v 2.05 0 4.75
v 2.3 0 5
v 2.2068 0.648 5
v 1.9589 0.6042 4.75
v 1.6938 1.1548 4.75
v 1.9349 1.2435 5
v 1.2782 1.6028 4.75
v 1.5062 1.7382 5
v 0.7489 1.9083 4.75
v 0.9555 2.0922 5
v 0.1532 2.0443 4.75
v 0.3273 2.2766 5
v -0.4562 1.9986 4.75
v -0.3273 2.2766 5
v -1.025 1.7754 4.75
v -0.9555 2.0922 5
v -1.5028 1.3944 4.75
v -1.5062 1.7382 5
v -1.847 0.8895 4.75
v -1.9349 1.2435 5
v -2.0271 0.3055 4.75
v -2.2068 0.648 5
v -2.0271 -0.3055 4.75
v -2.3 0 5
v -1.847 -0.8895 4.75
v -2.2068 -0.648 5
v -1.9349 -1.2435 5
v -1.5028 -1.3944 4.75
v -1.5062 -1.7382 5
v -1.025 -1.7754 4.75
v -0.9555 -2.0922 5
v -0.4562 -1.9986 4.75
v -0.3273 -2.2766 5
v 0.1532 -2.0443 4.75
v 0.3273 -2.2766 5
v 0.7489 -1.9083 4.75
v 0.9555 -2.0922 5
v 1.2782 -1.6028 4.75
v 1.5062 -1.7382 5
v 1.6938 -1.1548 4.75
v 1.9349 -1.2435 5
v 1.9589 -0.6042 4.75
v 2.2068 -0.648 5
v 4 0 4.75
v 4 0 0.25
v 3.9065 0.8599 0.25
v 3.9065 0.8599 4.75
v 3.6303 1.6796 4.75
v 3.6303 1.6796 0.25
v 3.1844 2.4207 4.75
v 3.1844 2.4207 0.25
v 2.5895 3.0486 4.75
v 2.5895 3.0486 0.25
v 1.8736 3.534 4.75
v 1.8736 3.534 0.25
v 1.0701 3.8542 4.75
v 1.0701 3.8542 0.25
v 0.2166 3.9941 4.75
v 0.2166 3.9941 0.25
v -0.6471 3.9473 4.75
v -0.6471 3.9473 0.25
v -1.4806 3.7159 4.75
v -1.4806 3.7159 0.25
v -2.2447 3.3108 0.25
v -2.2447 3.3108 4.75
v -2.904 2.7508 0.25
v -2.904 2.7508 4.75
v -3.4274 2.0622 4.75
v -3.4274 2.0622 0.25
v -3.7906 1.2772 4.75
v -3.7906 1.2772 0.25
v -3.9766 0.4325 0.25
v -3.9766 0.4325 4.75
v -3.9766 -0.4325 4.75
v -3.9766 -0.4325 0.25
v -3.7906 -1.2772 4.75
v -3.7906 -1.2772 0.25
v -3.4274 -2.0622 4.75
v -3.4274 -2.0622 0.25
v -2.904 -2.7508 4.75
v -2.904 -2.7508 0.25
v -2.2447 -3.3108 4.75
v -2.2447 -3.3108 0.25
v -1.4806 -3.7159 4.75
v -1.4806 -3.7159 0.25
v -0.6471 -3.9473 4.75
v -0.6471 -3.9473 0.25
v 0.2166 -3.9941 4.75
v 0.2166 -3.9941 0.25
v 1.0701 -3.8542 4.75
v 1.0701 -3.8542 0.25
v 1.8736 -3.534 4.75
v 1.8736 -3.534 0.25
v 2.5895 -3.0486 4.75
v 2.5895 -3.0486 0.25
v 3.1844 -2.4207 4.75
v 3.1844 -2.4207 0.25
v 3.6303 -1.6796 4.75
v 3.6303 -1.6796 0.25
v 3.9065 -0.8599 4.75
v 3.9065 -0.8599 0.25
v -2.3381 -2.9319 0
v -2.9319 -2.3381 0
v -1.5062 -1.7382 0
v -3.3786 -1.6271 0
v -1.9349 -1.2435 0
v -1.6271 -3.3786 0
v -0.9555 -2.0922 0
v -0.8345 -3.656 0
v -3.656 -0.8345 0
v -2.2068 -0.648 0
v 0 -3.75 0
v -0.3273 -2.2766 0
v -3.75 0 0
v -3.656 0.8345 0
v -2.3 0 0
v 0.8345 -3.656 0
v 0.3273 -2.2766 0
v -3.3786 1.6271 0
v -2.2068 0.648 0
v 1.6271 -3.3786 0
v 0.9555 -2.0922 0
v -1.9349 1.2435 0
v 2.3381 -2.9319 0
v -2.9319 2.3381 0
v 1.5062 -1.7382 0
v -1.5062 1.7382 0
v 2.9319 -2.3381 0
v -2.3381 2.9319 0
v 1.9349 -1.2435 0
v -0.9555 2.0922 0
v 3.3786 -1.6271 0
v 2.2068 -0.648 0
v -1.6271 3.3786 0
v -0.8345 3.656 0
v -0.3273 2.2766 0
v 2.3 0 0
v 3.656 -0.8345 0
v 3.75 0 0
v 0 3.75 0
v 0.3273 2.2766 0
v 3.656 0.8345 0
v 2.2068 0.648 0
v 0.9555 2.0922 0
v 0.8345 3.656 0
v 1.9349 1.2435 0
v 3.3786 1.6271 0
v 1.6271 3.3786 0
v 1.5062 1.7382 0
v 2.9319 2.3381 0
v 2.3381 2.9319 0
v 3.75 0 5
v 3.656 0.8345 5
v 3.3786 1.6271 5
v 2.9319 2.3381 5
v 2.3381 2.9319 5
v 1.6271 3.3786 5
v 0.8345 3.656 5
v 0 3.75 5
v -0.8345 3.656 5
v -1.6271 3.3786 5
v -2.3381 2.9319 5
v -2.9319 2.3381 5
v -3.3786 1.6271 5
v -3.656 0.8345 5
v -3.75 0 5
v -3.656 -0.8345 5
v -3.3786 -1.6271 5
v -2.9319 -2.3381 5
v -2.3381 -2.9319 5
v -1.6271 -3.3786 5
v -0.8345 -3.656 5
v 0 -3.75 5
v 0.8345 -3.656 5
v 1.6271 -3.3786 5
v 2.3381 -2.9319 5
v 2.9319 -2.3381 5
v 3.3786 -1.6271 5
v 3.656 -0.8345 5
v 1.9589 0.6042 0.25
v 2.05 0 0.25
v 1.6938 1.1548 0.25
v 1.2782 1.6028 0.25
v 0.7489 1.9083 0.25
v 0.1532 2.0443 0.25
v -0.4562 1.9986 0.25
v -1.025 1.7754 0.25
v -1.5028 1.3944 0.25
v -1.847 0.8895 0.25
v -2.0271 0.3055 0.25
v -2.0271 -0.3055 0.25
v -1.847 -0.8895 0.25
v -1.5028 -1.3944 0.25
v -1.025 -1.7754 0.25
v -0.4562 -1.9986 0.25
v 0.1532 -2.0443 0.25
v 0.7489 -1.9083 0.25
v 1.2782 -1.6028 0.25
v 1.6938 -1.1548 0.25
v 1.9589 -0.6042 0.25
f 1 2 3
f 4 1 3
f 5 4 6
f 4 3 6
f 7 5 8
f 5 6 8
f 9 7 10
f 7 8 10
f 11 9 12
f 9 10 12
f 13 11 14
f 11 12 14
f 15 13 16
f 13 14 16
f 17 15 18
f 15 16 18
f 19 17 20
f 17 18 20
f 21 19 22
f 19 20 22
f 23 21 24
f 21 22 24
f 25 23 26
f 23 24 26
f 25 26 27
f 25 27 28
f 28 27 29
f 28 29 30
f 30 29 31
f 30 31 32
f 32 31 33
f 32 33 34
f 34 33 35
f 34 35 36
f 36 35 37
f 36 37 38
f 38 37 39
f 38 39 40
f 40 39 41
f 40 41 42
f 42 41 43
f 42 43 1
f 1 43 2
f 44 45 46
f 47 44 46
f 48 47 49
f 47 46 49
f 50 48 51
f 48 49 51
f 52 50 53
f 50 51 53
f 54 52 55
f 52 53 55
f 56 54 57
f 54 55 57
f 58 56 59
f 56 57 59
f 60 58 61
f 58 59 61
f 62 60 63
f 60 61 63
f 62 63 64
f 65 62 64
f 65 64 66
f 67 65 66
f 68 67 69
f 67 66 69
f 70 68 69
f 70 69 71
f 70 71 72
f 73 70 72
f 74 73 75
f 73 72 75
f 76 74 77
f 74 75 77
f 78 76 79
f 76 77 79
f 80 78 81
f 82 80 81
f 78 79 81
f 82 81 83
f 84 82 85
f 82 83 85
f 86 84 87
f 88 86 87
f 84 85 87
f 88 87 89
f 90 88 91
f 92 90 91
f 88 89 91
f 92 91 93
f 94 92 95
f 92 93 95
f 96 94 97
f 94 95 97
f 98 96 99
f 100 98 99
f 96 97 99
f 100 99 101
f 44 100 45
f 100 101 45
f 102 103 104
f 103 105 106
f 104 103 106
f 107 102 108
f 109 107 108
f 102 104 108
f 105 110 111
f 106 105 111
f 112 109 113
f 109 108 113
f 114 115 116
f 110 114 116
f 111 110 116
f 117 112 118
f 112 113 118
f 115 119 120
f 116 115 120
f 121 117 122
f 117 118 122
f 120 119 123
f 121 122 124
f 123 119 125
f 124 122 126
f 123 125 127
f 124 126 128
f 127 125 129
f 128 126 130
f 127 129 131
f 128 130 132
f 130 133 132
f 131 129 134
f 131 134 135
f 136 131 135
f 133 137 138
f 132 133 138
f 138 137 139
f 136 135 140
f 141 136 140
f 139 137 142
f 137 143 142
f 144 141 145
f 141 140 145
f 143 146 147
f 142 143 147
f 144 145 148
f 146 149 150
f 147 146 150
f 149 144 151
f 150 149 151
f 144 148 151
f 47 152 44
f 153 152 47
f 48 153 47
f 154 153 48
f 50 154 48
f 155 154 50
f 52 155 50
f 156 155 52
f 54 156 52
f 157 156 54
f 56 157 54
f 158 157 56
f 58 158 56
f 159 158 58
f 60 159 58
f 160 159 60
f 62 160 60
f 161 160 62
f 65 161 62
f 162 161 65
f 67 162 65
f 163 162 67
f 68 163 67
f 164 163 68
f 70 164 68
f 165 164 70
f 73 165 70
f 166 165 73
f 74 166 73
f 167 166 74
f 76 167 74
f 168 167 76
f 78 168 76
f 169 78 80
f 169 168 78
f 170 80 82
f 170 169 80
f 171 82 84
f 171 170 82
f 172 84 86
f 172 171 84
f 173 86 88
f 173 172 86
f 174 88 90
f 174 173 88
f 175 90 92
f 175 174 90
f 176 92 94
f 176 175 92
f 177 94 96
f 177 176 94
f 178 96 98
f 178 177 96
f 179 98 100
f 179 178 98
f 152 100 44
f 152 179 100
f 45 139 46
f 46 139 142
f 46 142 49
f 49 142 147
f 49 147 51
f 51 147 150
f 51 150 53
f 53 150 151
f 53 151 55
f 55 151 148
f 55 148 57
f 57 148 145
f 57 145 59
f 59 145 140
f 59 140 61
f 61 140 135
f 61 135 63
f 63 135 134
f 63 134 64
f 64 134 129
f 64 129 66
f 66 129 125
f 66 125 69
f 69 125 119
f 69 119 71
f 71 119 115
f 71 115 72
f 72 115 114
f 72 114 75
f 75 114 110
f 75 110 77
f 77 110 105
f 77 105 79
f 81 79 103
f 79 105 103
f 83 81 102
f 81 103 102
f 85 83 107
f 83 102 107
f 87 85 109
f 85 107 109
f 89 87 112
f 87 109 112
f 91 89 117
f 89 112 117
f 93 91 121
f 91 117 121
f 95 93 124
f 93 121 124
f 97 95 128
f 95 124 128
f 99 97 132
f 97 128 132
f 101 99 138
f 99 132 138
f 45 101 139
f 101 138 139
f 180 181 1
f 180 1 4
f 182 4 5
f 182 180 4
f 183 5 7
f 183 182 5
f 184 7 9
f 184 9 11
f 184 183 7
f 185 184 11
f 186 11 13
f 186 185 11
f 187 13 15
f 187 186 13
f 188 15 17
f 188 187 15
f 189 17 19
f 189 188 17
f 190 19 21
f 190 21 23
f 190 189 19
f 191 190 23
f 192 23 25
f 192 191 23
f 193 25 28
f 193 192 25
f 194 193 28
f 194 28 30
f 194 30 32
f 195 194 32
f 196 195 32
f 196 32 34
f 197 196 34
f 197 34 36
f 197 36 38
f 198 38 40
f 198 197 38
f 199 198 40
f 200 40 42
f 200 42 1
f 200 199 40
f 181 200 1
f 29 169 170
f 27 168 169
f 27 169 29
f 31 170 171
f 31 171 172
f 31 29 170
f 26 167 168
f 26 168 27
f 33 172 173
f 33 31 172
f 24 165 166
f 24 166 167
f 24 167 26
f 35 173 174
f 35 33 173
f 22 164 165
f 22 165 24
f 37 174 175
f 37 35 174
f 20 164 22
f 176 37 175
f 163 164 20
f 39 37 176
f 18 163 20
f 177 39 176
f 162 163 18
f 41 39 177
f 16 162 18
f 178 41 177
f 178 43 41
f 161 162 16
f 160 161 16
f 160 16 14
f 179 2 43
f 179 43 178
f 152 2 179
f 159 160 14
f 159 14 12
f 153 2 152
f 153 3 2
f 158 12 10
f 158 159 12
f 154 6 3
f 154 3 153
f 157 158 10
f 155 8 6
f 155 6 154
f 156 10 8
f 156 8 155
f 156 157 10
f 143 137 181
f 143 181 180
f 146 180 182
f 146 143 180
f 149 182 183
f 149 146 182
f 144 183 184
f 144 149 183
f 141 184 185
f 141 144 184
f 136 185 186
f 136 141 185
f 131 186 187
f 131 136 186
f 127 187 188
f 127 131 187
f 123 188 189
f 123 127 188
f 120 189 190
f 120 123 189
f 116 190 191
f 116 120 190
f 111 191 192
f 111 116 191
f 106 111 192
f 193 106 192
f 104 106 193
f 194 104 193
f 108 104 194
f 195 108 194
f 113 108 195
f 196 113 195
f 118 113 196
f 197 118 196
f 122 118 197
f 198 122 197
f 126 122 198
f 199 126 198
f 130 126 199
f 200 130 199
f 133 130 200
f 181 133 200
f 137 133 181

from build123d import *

# Parameters (mm, degrees)
SKETCH1_R      = 4
SKETCH1_R_2    = 2.05
EXTRUDE1_DEPTH = 5
CHAMFER2_SIZE  = 0.25


with BuildPart() as part:
    # Sketch1 → Extrude1 (new body)
    with BuildSketch(Plane.XY):
        Circle(SKETCH1_R)
        Circle(SKETCH1_R_2, mode=Mode.SUBTRACT)
    extrude(amount=EXTRUDE1_DEPTH)

    # Chamfer2
    chamfer2_edges = [part.edges().sort_by_distance(p)[0] for p in [
        (-4, 0, 0),
        (-4, 0, 5),
        (-2.05, 0, 0),
        (-2.05, 0, 5),
    ]]
    chamfer(chamfer2_edges, length=CHAMFER2_SIZE)


solid = part.part
